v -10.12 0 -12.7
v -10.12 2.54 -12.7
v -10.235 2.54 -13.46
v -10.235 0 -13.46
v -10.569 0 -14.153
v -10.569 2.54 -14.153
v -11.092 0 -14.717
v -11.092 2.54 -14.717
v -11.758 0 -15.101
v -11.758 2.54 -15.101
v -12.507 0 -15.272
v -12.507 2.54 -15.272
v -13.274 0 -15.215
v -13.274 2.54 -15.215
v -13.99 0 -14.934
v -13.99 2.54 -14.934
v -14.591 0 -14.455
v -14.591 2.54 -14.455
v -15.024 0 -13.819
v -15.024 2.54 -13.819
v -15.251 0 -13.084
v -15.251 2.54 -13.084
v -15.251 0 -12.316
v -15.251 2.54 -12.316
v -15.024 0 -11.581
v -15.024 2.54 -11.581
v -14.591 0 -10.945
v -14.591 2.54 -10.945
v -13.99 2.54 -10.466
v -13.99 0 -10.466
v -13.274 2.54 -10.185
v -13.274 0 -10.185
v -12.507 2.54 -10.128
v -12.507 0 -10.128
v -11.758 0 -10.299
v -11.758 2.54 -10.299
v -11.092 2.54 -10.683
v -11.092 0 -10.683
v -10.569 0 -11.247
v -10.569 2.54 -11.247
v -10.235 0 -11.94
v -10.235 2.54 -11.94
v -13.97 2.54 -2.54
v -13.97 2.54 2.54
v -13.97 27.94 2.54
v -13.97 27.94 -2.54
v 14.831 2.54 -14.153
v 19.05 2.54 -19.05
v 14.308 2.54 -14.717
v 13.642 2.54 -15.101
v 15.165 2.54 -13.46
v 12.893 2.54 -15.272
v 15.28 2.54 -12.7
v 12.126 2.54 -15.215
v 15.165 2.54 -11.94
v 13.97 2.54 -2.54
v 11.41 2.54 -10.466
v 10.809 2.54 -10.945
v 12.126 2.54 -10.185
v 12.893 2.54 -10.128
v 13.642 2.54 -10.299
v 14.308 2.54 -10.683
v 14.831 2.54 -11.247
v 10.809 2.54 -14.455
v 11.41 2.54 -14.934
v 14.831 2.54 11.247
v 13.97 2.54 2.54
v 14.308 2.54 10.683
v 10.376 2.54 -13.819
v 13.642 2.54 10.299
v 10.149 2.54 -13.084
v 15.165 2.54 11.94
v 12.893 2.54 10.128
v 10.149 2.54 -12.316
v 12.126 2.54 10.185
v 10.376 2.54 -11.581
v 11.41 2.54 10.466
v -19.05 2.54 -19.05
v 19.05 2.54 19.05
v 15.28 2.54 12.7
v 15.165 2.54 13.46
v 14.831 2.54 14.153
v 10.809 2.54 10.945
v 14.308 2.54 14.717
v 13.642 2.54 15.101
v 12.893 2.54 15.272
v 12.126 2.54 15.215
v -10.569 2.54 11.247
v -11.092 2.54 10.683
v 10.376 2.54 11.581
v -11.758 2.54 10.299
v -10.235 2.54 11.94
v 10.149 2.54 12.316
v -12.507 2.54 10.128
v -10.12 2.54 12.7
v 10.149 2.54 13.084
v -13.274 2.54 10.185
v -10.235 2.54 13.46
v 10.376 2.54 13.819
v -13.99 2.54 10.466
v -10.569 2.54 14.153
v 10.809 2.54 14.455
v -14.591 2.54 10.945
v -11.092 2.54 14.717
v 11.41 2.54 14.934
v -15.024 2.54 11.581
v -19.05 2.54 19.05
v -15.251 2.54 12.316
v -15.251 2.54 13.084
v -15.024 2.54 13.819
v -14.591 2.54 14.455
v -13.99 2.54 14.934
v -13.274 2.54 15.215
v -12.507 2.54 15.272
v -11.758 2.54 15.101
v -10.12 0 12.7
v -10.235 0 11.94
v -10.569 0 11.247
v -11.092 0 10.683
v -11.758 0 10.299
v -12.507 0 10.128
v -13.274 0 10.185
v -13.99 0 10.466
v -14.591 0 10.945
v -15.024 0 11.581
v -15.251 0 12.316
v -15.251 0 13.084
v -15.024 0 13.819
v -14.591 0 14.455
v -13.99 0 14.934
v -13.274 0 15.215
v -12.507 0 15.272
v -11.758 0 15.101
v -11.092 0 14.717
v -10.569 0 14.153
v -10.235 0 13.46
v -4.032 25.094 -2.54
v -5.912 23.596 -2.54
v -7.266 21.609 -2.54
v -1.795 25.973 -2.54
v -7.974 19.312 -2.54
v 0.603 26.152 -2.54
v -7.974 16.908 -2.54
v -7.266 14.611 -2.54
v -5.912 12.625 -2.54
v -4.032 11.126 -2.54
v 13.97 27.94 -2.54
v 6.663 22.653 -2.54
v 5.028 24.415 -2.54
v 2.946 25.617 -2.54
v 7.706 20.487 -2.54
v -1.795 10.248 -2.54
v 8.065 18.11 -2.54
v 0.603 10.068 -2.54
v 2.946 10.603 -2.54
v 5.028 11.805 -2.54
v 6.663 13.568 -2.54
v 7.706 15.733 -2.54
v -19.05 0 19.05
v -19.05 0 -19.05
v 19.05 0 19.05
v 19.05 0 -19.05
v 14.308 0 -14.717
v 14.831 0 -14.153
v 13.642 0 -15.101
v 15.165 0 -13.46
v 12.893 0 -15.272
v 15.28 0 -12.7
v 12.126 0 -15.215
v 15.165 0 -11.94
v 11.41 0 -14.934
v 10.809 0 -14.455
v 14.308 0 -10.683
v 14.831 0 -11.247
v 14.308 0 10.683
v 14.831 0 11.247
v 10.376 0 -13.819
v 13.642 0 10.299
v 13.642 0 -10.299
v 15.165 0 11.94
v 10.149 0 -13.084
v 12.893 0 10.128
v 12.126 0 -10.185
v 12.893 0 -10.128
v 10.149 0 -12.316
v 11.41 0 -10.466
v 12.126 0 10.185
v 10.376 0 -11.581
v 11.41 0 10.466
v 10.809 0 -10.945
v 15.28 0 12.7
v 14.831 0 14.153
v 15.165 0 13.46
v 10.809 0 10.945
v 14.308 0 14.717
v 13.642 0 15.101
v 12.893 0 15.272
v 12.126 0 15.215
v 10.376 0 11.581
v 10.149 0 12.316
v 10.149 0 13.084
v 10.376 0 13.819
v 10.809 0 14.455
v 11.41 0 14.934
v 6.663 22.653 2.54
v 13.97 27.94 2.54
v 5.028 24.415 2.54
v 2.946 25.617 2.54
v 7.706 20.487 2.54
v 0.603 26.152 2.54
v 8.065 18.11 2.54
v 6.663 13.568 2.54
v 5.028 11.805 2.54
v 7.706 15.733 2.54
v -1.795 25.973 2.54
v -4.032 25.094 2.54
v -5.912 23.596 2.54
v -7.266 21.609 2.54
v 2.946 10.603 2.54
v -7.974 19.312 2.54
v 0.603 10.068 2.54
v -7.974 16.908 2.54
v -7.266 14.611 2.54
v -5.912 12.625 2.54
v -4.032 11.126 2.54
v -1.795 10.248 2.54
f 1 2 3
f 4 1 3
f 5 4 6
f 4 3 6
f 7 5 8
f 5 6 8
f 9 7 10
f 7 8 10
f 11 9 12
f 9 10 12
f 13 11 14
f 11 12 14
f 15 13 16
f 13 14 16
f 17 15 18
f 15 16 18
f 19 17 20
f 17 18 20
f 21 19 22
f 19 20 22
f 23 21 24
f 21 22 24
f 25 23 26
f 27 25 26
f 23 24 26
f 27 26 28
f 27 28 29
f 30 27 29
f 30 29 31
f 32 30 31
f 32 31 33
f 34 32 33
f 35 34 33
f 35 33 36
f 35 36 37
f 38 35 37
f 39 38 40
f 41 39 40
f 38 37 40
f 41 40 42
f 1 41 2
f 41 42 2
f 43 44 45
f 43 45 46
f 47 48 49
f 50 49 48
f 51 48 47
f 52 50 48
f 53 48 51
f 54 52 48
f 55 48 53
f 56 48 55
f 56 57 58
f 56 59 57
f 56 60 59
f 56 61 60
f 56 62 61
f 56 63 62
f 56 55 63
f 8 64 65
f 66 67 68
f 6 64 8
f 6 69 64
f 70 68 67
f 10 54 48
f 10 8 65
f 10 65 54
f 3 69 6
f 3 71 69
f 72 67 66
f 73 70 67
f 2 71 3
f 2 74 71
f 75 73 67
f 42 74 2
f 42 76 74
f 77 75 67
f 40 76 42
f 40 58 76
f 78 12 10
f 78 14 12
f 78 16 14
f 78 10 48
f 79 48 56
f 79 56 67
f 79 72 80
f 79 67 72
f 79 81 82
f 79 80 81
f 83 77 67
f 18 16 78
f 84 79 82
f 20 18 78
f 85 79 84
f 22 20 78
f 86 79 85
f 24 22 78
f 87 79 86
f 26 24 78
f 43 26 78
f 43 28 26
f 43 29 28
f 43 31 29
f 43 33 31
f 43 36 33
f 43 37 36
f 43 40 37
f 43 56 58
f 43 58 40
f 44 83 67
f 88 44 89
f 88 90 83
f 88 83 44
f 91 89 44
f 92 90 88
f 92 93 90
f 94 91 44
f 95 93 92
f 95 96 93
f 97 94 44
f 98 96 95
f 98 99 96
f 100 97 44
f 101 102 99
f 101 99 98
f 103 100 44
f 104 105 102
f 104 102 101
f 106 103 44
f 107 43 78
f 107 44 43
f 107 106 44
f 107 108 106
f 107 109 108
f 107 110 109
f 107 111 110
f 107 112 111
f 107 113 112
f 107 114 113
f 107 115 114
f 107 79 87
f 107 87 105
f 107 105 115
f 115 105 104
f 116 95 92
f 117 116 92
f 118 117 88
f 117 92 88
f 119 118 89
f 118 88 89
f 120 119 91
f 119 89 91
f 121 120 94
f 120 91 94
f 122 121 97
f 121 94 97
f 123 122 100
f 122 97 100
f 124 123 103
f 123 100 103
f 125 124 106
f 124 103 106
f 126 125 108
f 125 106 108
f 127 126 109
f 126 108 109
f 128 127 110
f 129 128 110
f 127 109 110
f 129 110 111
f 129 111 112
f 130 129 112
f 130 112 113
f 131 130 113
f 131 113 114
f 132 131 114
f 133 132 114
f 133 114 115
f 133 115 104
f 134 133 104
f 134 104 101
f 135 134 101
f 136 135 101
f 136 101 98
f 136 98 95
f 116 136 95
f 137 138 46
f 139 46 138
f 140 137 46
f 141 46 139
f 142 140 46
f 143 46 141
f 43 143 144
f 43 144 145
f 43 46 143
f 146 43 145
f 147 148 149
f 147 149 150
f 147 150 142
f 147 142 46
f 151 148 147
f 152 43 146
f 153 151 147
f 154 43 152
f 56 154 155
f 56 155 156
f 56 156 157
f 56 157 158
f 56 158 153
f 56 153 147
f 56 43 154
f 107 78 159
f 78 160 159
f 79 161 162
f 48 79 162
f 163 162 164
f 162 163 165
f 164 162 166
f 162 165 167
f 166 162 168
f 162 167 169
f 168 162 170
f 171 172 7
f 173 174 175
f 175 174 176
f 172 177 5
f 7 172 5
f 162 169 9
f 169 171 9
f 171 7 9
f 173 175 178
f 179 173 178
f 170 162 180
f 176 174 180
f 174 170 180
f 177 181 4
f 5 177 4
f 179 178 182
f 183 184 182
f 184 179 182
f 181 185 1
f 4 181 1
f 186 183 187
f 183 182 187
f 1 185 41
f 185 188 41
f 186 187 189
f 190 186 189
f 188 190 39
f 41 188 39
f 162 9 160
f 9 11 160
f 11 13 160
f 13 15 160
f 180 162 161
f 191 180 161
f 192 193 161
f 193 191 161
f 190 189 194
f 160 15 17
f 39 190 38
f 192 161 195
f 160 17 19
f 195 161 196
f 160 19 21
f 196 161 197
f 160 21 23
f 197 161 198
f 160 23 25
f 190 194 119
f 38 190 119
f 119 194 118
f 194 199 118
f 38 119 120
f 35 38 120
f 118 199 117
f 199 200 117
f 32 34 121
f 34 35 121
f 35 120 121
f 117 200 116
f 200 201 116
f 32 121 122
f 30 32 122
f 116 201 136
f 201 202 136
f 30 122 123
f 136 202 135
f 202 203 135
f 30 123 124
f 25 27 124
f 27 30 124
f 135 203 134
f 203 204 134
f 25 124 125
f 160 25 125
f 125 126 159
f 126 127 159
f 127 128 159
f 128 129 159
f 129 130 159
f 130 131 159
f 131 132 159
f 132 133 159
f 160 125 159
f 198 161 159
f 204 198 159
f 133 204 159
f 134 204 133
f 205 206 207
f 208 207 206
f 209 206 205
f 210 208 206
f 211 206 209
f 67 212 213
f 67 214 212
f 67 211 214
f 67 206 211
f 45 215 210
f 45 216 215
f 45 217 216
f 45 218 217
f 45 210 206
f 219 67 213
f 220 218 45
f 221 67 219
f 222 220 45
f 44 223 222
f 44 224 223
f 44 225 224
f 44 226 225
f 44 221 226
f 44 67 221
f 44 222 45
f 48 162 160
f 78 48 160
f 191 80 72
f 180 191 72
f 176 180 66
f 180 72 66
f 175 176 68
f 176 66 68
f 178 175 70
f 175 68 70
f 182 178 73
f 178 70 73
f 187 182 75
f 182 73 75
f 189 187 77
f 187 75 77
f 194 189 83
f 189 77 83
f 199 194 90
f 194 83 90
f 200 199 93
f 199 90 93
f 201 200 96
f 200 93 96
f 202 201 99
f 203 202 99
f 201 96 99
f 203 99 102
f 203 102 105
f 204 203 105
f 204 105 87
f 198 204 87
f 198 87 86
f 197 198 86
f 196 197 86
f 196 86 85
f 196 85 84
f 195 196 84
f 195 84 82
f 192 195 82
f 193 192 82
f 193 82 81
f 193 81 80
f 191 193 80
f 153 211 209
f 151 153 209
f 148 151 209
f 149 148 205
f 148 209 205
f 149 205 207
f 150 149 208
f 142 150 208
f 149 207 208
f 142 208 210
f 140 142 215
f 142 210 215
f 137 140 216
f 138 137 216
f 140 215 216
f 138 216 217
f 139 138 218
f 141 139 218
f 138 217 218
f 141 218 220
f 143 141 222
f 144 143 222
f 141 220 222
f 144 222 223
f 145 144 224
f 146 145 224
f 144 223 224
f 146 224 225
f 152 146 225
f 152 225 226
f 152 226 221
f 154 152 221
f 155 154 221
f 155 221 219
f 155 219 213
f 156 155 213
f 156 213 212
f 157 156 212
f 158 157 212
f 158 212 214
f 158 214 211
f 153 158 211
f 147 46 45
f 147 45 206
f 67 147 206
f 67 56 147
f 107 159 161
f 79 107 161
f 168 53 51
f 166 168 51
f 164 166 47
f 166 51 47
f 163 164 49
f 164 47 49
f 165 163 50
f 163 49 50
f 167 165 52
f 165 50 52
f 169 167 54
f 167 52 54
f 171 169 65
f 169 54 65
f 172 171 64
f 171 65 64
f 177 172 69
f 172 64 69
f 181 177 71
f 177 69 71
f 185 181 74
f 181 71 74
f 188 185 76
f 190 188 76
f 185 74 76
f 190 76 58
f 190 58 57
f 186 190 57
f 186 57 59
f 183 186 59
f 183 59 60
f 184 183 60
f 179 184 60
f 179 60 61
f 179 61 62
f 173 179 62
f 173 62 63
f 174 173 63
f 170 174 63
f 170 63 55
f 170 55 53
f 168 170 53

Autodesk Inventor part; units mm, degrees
ref_plane "YZ Plane" through (0, 0, 0) normal (1, 0, 0) x (0, 1, 0)
ref_plane "XZ Plane" through (0, 0, 0) normal (0, 1, 0) x (-1, 0, 0)
ref_plane "XY Plane" through (0, 0, 0) normal (0, 0, 1) x (1, 0, 0)
sketch "Sketch1" plane through (0, 0, 0) normal (0, 1, 0) x (-1, 0, 0)
  line L0 (-19.05, -19.05) -> (19.05, -19.05)
  line L1 (19.05, -19.05) -> (19.05, 19.05)
  line L2 (19.05, 19.05) -> (-19.05, 19.05)
  line L3 (-19.05, 19.05) -> (-19.05, -19.05)
  line L4 (-19.05, -19.05) -> (19.05, 19.05) construction
  line L5 (19.05, -19.05) -> (-19.05, 19.05) construction
  point P0 (0, 0)
  dimension "d0" = 38.1
  dimension "d1" = 38.1
extrude "Extrusion1" add sketch "Sketch1" along normal blind 2.54
sketch "Sketch2" plane through (0, 2.54, 0) normal (0, 1, 0) x (1, 0, 0)
  line L0 (13.97, -2.54) -> (-13.97, -2.54)
  line L1 (-13.97, -2.54) -> (-13.97, 2.54)
  line L2 (-13.97, 2.54) -> (13.97, 2.54)
  line L3 (13.97, 2.54) -> (13.97, -2.54)
  line L4 (-19.05, 19.05) -> (-19.05, -19.05) projected
  line L5 (19.05, -19.05) -> (19.05, 19.05) projected
  line L6 (19.05, 19.05) -> (-19.05, 19.05) projected
  point P0 (0, 0)
  dimension "d4" = 5.08
  dimension "d5" = 5.08
  dimension "d6" = 16.51
  dimension "d7" = 5.08
extrude "Extrusion2" add sketch "Sketch2" along normal blind 25.4
sketch "Sketch3" plane through (-13.97, 2.54, 2.54) normal (0, 0, 1) x (1, 0, 0)
  circle A0 centre (13.97, 15.5704) radius 8.0645
  point P0 (13.97, -2.54)
  dimension "d10" = 16.129
extrude "Extrusion3" cut sketch "Sketch3" against normal blind 50.8
sketch "Sketch4" plane through (0, 2.54, 0) normal (0, 1, 0) x (1, 0, 0)
  circle A0 centre (-12.7, -12.7) radius 2.5797
  circle A1 centre (-12.7, 12.7) radius 2.5797
  circle A2 centre (12.7, 12.7) radius 2.5797
  circle A3 centre (12.7, -12.7) radius 2.5797
  line L0 (-19.05, 19.05) -> (-19.05, -19.05) projected
  line L1 (-19.05, -19.05) -> (19.05, -19.05) projected
  line L2 (19.05, -19.05) -> (19.05, 19.05) projected
  line L3 (19.05, 19.05) -> (-19.05, 19.05) projected
  point P0 (0, 0)
  dimension "d13" = 5.1594
  dimension "d14" = 5.1594
  dimension "d15" = 5.1594
  dimension "d16" = 5.1594
  dimension "d17" = 6.35
  dimension "d18" = 6.35
  dimension "d19" = 6.35
  dimension "d20" = 6.35
  dimension "d21" = 6.35
  dimension "d22" = 6.35
  dimension "d23" = 6.35
  dimension "d24" = 6.35
extrude "Extrusion4" cut sketch "Sketch4" against normal blind 50.8 contours A0 | A1 | A2 | A3
equation "\"d1\" = d0"
equation "\"d4\" = d5"
equation "\"d14\" = d13"
equation "\"d15\" = d13"
equation "\"d16\" = d13"
equation "\"d18\" = d17"
equation "\"d19\" = d17"
equation "\"d20\" = d17"
equation "\"d21\" = d17"
equation "\"d22\" = d17"
equation "\"d23\" = d17"
equation "\"d24\" = d17"
properties part number "pneumatics front holder"
